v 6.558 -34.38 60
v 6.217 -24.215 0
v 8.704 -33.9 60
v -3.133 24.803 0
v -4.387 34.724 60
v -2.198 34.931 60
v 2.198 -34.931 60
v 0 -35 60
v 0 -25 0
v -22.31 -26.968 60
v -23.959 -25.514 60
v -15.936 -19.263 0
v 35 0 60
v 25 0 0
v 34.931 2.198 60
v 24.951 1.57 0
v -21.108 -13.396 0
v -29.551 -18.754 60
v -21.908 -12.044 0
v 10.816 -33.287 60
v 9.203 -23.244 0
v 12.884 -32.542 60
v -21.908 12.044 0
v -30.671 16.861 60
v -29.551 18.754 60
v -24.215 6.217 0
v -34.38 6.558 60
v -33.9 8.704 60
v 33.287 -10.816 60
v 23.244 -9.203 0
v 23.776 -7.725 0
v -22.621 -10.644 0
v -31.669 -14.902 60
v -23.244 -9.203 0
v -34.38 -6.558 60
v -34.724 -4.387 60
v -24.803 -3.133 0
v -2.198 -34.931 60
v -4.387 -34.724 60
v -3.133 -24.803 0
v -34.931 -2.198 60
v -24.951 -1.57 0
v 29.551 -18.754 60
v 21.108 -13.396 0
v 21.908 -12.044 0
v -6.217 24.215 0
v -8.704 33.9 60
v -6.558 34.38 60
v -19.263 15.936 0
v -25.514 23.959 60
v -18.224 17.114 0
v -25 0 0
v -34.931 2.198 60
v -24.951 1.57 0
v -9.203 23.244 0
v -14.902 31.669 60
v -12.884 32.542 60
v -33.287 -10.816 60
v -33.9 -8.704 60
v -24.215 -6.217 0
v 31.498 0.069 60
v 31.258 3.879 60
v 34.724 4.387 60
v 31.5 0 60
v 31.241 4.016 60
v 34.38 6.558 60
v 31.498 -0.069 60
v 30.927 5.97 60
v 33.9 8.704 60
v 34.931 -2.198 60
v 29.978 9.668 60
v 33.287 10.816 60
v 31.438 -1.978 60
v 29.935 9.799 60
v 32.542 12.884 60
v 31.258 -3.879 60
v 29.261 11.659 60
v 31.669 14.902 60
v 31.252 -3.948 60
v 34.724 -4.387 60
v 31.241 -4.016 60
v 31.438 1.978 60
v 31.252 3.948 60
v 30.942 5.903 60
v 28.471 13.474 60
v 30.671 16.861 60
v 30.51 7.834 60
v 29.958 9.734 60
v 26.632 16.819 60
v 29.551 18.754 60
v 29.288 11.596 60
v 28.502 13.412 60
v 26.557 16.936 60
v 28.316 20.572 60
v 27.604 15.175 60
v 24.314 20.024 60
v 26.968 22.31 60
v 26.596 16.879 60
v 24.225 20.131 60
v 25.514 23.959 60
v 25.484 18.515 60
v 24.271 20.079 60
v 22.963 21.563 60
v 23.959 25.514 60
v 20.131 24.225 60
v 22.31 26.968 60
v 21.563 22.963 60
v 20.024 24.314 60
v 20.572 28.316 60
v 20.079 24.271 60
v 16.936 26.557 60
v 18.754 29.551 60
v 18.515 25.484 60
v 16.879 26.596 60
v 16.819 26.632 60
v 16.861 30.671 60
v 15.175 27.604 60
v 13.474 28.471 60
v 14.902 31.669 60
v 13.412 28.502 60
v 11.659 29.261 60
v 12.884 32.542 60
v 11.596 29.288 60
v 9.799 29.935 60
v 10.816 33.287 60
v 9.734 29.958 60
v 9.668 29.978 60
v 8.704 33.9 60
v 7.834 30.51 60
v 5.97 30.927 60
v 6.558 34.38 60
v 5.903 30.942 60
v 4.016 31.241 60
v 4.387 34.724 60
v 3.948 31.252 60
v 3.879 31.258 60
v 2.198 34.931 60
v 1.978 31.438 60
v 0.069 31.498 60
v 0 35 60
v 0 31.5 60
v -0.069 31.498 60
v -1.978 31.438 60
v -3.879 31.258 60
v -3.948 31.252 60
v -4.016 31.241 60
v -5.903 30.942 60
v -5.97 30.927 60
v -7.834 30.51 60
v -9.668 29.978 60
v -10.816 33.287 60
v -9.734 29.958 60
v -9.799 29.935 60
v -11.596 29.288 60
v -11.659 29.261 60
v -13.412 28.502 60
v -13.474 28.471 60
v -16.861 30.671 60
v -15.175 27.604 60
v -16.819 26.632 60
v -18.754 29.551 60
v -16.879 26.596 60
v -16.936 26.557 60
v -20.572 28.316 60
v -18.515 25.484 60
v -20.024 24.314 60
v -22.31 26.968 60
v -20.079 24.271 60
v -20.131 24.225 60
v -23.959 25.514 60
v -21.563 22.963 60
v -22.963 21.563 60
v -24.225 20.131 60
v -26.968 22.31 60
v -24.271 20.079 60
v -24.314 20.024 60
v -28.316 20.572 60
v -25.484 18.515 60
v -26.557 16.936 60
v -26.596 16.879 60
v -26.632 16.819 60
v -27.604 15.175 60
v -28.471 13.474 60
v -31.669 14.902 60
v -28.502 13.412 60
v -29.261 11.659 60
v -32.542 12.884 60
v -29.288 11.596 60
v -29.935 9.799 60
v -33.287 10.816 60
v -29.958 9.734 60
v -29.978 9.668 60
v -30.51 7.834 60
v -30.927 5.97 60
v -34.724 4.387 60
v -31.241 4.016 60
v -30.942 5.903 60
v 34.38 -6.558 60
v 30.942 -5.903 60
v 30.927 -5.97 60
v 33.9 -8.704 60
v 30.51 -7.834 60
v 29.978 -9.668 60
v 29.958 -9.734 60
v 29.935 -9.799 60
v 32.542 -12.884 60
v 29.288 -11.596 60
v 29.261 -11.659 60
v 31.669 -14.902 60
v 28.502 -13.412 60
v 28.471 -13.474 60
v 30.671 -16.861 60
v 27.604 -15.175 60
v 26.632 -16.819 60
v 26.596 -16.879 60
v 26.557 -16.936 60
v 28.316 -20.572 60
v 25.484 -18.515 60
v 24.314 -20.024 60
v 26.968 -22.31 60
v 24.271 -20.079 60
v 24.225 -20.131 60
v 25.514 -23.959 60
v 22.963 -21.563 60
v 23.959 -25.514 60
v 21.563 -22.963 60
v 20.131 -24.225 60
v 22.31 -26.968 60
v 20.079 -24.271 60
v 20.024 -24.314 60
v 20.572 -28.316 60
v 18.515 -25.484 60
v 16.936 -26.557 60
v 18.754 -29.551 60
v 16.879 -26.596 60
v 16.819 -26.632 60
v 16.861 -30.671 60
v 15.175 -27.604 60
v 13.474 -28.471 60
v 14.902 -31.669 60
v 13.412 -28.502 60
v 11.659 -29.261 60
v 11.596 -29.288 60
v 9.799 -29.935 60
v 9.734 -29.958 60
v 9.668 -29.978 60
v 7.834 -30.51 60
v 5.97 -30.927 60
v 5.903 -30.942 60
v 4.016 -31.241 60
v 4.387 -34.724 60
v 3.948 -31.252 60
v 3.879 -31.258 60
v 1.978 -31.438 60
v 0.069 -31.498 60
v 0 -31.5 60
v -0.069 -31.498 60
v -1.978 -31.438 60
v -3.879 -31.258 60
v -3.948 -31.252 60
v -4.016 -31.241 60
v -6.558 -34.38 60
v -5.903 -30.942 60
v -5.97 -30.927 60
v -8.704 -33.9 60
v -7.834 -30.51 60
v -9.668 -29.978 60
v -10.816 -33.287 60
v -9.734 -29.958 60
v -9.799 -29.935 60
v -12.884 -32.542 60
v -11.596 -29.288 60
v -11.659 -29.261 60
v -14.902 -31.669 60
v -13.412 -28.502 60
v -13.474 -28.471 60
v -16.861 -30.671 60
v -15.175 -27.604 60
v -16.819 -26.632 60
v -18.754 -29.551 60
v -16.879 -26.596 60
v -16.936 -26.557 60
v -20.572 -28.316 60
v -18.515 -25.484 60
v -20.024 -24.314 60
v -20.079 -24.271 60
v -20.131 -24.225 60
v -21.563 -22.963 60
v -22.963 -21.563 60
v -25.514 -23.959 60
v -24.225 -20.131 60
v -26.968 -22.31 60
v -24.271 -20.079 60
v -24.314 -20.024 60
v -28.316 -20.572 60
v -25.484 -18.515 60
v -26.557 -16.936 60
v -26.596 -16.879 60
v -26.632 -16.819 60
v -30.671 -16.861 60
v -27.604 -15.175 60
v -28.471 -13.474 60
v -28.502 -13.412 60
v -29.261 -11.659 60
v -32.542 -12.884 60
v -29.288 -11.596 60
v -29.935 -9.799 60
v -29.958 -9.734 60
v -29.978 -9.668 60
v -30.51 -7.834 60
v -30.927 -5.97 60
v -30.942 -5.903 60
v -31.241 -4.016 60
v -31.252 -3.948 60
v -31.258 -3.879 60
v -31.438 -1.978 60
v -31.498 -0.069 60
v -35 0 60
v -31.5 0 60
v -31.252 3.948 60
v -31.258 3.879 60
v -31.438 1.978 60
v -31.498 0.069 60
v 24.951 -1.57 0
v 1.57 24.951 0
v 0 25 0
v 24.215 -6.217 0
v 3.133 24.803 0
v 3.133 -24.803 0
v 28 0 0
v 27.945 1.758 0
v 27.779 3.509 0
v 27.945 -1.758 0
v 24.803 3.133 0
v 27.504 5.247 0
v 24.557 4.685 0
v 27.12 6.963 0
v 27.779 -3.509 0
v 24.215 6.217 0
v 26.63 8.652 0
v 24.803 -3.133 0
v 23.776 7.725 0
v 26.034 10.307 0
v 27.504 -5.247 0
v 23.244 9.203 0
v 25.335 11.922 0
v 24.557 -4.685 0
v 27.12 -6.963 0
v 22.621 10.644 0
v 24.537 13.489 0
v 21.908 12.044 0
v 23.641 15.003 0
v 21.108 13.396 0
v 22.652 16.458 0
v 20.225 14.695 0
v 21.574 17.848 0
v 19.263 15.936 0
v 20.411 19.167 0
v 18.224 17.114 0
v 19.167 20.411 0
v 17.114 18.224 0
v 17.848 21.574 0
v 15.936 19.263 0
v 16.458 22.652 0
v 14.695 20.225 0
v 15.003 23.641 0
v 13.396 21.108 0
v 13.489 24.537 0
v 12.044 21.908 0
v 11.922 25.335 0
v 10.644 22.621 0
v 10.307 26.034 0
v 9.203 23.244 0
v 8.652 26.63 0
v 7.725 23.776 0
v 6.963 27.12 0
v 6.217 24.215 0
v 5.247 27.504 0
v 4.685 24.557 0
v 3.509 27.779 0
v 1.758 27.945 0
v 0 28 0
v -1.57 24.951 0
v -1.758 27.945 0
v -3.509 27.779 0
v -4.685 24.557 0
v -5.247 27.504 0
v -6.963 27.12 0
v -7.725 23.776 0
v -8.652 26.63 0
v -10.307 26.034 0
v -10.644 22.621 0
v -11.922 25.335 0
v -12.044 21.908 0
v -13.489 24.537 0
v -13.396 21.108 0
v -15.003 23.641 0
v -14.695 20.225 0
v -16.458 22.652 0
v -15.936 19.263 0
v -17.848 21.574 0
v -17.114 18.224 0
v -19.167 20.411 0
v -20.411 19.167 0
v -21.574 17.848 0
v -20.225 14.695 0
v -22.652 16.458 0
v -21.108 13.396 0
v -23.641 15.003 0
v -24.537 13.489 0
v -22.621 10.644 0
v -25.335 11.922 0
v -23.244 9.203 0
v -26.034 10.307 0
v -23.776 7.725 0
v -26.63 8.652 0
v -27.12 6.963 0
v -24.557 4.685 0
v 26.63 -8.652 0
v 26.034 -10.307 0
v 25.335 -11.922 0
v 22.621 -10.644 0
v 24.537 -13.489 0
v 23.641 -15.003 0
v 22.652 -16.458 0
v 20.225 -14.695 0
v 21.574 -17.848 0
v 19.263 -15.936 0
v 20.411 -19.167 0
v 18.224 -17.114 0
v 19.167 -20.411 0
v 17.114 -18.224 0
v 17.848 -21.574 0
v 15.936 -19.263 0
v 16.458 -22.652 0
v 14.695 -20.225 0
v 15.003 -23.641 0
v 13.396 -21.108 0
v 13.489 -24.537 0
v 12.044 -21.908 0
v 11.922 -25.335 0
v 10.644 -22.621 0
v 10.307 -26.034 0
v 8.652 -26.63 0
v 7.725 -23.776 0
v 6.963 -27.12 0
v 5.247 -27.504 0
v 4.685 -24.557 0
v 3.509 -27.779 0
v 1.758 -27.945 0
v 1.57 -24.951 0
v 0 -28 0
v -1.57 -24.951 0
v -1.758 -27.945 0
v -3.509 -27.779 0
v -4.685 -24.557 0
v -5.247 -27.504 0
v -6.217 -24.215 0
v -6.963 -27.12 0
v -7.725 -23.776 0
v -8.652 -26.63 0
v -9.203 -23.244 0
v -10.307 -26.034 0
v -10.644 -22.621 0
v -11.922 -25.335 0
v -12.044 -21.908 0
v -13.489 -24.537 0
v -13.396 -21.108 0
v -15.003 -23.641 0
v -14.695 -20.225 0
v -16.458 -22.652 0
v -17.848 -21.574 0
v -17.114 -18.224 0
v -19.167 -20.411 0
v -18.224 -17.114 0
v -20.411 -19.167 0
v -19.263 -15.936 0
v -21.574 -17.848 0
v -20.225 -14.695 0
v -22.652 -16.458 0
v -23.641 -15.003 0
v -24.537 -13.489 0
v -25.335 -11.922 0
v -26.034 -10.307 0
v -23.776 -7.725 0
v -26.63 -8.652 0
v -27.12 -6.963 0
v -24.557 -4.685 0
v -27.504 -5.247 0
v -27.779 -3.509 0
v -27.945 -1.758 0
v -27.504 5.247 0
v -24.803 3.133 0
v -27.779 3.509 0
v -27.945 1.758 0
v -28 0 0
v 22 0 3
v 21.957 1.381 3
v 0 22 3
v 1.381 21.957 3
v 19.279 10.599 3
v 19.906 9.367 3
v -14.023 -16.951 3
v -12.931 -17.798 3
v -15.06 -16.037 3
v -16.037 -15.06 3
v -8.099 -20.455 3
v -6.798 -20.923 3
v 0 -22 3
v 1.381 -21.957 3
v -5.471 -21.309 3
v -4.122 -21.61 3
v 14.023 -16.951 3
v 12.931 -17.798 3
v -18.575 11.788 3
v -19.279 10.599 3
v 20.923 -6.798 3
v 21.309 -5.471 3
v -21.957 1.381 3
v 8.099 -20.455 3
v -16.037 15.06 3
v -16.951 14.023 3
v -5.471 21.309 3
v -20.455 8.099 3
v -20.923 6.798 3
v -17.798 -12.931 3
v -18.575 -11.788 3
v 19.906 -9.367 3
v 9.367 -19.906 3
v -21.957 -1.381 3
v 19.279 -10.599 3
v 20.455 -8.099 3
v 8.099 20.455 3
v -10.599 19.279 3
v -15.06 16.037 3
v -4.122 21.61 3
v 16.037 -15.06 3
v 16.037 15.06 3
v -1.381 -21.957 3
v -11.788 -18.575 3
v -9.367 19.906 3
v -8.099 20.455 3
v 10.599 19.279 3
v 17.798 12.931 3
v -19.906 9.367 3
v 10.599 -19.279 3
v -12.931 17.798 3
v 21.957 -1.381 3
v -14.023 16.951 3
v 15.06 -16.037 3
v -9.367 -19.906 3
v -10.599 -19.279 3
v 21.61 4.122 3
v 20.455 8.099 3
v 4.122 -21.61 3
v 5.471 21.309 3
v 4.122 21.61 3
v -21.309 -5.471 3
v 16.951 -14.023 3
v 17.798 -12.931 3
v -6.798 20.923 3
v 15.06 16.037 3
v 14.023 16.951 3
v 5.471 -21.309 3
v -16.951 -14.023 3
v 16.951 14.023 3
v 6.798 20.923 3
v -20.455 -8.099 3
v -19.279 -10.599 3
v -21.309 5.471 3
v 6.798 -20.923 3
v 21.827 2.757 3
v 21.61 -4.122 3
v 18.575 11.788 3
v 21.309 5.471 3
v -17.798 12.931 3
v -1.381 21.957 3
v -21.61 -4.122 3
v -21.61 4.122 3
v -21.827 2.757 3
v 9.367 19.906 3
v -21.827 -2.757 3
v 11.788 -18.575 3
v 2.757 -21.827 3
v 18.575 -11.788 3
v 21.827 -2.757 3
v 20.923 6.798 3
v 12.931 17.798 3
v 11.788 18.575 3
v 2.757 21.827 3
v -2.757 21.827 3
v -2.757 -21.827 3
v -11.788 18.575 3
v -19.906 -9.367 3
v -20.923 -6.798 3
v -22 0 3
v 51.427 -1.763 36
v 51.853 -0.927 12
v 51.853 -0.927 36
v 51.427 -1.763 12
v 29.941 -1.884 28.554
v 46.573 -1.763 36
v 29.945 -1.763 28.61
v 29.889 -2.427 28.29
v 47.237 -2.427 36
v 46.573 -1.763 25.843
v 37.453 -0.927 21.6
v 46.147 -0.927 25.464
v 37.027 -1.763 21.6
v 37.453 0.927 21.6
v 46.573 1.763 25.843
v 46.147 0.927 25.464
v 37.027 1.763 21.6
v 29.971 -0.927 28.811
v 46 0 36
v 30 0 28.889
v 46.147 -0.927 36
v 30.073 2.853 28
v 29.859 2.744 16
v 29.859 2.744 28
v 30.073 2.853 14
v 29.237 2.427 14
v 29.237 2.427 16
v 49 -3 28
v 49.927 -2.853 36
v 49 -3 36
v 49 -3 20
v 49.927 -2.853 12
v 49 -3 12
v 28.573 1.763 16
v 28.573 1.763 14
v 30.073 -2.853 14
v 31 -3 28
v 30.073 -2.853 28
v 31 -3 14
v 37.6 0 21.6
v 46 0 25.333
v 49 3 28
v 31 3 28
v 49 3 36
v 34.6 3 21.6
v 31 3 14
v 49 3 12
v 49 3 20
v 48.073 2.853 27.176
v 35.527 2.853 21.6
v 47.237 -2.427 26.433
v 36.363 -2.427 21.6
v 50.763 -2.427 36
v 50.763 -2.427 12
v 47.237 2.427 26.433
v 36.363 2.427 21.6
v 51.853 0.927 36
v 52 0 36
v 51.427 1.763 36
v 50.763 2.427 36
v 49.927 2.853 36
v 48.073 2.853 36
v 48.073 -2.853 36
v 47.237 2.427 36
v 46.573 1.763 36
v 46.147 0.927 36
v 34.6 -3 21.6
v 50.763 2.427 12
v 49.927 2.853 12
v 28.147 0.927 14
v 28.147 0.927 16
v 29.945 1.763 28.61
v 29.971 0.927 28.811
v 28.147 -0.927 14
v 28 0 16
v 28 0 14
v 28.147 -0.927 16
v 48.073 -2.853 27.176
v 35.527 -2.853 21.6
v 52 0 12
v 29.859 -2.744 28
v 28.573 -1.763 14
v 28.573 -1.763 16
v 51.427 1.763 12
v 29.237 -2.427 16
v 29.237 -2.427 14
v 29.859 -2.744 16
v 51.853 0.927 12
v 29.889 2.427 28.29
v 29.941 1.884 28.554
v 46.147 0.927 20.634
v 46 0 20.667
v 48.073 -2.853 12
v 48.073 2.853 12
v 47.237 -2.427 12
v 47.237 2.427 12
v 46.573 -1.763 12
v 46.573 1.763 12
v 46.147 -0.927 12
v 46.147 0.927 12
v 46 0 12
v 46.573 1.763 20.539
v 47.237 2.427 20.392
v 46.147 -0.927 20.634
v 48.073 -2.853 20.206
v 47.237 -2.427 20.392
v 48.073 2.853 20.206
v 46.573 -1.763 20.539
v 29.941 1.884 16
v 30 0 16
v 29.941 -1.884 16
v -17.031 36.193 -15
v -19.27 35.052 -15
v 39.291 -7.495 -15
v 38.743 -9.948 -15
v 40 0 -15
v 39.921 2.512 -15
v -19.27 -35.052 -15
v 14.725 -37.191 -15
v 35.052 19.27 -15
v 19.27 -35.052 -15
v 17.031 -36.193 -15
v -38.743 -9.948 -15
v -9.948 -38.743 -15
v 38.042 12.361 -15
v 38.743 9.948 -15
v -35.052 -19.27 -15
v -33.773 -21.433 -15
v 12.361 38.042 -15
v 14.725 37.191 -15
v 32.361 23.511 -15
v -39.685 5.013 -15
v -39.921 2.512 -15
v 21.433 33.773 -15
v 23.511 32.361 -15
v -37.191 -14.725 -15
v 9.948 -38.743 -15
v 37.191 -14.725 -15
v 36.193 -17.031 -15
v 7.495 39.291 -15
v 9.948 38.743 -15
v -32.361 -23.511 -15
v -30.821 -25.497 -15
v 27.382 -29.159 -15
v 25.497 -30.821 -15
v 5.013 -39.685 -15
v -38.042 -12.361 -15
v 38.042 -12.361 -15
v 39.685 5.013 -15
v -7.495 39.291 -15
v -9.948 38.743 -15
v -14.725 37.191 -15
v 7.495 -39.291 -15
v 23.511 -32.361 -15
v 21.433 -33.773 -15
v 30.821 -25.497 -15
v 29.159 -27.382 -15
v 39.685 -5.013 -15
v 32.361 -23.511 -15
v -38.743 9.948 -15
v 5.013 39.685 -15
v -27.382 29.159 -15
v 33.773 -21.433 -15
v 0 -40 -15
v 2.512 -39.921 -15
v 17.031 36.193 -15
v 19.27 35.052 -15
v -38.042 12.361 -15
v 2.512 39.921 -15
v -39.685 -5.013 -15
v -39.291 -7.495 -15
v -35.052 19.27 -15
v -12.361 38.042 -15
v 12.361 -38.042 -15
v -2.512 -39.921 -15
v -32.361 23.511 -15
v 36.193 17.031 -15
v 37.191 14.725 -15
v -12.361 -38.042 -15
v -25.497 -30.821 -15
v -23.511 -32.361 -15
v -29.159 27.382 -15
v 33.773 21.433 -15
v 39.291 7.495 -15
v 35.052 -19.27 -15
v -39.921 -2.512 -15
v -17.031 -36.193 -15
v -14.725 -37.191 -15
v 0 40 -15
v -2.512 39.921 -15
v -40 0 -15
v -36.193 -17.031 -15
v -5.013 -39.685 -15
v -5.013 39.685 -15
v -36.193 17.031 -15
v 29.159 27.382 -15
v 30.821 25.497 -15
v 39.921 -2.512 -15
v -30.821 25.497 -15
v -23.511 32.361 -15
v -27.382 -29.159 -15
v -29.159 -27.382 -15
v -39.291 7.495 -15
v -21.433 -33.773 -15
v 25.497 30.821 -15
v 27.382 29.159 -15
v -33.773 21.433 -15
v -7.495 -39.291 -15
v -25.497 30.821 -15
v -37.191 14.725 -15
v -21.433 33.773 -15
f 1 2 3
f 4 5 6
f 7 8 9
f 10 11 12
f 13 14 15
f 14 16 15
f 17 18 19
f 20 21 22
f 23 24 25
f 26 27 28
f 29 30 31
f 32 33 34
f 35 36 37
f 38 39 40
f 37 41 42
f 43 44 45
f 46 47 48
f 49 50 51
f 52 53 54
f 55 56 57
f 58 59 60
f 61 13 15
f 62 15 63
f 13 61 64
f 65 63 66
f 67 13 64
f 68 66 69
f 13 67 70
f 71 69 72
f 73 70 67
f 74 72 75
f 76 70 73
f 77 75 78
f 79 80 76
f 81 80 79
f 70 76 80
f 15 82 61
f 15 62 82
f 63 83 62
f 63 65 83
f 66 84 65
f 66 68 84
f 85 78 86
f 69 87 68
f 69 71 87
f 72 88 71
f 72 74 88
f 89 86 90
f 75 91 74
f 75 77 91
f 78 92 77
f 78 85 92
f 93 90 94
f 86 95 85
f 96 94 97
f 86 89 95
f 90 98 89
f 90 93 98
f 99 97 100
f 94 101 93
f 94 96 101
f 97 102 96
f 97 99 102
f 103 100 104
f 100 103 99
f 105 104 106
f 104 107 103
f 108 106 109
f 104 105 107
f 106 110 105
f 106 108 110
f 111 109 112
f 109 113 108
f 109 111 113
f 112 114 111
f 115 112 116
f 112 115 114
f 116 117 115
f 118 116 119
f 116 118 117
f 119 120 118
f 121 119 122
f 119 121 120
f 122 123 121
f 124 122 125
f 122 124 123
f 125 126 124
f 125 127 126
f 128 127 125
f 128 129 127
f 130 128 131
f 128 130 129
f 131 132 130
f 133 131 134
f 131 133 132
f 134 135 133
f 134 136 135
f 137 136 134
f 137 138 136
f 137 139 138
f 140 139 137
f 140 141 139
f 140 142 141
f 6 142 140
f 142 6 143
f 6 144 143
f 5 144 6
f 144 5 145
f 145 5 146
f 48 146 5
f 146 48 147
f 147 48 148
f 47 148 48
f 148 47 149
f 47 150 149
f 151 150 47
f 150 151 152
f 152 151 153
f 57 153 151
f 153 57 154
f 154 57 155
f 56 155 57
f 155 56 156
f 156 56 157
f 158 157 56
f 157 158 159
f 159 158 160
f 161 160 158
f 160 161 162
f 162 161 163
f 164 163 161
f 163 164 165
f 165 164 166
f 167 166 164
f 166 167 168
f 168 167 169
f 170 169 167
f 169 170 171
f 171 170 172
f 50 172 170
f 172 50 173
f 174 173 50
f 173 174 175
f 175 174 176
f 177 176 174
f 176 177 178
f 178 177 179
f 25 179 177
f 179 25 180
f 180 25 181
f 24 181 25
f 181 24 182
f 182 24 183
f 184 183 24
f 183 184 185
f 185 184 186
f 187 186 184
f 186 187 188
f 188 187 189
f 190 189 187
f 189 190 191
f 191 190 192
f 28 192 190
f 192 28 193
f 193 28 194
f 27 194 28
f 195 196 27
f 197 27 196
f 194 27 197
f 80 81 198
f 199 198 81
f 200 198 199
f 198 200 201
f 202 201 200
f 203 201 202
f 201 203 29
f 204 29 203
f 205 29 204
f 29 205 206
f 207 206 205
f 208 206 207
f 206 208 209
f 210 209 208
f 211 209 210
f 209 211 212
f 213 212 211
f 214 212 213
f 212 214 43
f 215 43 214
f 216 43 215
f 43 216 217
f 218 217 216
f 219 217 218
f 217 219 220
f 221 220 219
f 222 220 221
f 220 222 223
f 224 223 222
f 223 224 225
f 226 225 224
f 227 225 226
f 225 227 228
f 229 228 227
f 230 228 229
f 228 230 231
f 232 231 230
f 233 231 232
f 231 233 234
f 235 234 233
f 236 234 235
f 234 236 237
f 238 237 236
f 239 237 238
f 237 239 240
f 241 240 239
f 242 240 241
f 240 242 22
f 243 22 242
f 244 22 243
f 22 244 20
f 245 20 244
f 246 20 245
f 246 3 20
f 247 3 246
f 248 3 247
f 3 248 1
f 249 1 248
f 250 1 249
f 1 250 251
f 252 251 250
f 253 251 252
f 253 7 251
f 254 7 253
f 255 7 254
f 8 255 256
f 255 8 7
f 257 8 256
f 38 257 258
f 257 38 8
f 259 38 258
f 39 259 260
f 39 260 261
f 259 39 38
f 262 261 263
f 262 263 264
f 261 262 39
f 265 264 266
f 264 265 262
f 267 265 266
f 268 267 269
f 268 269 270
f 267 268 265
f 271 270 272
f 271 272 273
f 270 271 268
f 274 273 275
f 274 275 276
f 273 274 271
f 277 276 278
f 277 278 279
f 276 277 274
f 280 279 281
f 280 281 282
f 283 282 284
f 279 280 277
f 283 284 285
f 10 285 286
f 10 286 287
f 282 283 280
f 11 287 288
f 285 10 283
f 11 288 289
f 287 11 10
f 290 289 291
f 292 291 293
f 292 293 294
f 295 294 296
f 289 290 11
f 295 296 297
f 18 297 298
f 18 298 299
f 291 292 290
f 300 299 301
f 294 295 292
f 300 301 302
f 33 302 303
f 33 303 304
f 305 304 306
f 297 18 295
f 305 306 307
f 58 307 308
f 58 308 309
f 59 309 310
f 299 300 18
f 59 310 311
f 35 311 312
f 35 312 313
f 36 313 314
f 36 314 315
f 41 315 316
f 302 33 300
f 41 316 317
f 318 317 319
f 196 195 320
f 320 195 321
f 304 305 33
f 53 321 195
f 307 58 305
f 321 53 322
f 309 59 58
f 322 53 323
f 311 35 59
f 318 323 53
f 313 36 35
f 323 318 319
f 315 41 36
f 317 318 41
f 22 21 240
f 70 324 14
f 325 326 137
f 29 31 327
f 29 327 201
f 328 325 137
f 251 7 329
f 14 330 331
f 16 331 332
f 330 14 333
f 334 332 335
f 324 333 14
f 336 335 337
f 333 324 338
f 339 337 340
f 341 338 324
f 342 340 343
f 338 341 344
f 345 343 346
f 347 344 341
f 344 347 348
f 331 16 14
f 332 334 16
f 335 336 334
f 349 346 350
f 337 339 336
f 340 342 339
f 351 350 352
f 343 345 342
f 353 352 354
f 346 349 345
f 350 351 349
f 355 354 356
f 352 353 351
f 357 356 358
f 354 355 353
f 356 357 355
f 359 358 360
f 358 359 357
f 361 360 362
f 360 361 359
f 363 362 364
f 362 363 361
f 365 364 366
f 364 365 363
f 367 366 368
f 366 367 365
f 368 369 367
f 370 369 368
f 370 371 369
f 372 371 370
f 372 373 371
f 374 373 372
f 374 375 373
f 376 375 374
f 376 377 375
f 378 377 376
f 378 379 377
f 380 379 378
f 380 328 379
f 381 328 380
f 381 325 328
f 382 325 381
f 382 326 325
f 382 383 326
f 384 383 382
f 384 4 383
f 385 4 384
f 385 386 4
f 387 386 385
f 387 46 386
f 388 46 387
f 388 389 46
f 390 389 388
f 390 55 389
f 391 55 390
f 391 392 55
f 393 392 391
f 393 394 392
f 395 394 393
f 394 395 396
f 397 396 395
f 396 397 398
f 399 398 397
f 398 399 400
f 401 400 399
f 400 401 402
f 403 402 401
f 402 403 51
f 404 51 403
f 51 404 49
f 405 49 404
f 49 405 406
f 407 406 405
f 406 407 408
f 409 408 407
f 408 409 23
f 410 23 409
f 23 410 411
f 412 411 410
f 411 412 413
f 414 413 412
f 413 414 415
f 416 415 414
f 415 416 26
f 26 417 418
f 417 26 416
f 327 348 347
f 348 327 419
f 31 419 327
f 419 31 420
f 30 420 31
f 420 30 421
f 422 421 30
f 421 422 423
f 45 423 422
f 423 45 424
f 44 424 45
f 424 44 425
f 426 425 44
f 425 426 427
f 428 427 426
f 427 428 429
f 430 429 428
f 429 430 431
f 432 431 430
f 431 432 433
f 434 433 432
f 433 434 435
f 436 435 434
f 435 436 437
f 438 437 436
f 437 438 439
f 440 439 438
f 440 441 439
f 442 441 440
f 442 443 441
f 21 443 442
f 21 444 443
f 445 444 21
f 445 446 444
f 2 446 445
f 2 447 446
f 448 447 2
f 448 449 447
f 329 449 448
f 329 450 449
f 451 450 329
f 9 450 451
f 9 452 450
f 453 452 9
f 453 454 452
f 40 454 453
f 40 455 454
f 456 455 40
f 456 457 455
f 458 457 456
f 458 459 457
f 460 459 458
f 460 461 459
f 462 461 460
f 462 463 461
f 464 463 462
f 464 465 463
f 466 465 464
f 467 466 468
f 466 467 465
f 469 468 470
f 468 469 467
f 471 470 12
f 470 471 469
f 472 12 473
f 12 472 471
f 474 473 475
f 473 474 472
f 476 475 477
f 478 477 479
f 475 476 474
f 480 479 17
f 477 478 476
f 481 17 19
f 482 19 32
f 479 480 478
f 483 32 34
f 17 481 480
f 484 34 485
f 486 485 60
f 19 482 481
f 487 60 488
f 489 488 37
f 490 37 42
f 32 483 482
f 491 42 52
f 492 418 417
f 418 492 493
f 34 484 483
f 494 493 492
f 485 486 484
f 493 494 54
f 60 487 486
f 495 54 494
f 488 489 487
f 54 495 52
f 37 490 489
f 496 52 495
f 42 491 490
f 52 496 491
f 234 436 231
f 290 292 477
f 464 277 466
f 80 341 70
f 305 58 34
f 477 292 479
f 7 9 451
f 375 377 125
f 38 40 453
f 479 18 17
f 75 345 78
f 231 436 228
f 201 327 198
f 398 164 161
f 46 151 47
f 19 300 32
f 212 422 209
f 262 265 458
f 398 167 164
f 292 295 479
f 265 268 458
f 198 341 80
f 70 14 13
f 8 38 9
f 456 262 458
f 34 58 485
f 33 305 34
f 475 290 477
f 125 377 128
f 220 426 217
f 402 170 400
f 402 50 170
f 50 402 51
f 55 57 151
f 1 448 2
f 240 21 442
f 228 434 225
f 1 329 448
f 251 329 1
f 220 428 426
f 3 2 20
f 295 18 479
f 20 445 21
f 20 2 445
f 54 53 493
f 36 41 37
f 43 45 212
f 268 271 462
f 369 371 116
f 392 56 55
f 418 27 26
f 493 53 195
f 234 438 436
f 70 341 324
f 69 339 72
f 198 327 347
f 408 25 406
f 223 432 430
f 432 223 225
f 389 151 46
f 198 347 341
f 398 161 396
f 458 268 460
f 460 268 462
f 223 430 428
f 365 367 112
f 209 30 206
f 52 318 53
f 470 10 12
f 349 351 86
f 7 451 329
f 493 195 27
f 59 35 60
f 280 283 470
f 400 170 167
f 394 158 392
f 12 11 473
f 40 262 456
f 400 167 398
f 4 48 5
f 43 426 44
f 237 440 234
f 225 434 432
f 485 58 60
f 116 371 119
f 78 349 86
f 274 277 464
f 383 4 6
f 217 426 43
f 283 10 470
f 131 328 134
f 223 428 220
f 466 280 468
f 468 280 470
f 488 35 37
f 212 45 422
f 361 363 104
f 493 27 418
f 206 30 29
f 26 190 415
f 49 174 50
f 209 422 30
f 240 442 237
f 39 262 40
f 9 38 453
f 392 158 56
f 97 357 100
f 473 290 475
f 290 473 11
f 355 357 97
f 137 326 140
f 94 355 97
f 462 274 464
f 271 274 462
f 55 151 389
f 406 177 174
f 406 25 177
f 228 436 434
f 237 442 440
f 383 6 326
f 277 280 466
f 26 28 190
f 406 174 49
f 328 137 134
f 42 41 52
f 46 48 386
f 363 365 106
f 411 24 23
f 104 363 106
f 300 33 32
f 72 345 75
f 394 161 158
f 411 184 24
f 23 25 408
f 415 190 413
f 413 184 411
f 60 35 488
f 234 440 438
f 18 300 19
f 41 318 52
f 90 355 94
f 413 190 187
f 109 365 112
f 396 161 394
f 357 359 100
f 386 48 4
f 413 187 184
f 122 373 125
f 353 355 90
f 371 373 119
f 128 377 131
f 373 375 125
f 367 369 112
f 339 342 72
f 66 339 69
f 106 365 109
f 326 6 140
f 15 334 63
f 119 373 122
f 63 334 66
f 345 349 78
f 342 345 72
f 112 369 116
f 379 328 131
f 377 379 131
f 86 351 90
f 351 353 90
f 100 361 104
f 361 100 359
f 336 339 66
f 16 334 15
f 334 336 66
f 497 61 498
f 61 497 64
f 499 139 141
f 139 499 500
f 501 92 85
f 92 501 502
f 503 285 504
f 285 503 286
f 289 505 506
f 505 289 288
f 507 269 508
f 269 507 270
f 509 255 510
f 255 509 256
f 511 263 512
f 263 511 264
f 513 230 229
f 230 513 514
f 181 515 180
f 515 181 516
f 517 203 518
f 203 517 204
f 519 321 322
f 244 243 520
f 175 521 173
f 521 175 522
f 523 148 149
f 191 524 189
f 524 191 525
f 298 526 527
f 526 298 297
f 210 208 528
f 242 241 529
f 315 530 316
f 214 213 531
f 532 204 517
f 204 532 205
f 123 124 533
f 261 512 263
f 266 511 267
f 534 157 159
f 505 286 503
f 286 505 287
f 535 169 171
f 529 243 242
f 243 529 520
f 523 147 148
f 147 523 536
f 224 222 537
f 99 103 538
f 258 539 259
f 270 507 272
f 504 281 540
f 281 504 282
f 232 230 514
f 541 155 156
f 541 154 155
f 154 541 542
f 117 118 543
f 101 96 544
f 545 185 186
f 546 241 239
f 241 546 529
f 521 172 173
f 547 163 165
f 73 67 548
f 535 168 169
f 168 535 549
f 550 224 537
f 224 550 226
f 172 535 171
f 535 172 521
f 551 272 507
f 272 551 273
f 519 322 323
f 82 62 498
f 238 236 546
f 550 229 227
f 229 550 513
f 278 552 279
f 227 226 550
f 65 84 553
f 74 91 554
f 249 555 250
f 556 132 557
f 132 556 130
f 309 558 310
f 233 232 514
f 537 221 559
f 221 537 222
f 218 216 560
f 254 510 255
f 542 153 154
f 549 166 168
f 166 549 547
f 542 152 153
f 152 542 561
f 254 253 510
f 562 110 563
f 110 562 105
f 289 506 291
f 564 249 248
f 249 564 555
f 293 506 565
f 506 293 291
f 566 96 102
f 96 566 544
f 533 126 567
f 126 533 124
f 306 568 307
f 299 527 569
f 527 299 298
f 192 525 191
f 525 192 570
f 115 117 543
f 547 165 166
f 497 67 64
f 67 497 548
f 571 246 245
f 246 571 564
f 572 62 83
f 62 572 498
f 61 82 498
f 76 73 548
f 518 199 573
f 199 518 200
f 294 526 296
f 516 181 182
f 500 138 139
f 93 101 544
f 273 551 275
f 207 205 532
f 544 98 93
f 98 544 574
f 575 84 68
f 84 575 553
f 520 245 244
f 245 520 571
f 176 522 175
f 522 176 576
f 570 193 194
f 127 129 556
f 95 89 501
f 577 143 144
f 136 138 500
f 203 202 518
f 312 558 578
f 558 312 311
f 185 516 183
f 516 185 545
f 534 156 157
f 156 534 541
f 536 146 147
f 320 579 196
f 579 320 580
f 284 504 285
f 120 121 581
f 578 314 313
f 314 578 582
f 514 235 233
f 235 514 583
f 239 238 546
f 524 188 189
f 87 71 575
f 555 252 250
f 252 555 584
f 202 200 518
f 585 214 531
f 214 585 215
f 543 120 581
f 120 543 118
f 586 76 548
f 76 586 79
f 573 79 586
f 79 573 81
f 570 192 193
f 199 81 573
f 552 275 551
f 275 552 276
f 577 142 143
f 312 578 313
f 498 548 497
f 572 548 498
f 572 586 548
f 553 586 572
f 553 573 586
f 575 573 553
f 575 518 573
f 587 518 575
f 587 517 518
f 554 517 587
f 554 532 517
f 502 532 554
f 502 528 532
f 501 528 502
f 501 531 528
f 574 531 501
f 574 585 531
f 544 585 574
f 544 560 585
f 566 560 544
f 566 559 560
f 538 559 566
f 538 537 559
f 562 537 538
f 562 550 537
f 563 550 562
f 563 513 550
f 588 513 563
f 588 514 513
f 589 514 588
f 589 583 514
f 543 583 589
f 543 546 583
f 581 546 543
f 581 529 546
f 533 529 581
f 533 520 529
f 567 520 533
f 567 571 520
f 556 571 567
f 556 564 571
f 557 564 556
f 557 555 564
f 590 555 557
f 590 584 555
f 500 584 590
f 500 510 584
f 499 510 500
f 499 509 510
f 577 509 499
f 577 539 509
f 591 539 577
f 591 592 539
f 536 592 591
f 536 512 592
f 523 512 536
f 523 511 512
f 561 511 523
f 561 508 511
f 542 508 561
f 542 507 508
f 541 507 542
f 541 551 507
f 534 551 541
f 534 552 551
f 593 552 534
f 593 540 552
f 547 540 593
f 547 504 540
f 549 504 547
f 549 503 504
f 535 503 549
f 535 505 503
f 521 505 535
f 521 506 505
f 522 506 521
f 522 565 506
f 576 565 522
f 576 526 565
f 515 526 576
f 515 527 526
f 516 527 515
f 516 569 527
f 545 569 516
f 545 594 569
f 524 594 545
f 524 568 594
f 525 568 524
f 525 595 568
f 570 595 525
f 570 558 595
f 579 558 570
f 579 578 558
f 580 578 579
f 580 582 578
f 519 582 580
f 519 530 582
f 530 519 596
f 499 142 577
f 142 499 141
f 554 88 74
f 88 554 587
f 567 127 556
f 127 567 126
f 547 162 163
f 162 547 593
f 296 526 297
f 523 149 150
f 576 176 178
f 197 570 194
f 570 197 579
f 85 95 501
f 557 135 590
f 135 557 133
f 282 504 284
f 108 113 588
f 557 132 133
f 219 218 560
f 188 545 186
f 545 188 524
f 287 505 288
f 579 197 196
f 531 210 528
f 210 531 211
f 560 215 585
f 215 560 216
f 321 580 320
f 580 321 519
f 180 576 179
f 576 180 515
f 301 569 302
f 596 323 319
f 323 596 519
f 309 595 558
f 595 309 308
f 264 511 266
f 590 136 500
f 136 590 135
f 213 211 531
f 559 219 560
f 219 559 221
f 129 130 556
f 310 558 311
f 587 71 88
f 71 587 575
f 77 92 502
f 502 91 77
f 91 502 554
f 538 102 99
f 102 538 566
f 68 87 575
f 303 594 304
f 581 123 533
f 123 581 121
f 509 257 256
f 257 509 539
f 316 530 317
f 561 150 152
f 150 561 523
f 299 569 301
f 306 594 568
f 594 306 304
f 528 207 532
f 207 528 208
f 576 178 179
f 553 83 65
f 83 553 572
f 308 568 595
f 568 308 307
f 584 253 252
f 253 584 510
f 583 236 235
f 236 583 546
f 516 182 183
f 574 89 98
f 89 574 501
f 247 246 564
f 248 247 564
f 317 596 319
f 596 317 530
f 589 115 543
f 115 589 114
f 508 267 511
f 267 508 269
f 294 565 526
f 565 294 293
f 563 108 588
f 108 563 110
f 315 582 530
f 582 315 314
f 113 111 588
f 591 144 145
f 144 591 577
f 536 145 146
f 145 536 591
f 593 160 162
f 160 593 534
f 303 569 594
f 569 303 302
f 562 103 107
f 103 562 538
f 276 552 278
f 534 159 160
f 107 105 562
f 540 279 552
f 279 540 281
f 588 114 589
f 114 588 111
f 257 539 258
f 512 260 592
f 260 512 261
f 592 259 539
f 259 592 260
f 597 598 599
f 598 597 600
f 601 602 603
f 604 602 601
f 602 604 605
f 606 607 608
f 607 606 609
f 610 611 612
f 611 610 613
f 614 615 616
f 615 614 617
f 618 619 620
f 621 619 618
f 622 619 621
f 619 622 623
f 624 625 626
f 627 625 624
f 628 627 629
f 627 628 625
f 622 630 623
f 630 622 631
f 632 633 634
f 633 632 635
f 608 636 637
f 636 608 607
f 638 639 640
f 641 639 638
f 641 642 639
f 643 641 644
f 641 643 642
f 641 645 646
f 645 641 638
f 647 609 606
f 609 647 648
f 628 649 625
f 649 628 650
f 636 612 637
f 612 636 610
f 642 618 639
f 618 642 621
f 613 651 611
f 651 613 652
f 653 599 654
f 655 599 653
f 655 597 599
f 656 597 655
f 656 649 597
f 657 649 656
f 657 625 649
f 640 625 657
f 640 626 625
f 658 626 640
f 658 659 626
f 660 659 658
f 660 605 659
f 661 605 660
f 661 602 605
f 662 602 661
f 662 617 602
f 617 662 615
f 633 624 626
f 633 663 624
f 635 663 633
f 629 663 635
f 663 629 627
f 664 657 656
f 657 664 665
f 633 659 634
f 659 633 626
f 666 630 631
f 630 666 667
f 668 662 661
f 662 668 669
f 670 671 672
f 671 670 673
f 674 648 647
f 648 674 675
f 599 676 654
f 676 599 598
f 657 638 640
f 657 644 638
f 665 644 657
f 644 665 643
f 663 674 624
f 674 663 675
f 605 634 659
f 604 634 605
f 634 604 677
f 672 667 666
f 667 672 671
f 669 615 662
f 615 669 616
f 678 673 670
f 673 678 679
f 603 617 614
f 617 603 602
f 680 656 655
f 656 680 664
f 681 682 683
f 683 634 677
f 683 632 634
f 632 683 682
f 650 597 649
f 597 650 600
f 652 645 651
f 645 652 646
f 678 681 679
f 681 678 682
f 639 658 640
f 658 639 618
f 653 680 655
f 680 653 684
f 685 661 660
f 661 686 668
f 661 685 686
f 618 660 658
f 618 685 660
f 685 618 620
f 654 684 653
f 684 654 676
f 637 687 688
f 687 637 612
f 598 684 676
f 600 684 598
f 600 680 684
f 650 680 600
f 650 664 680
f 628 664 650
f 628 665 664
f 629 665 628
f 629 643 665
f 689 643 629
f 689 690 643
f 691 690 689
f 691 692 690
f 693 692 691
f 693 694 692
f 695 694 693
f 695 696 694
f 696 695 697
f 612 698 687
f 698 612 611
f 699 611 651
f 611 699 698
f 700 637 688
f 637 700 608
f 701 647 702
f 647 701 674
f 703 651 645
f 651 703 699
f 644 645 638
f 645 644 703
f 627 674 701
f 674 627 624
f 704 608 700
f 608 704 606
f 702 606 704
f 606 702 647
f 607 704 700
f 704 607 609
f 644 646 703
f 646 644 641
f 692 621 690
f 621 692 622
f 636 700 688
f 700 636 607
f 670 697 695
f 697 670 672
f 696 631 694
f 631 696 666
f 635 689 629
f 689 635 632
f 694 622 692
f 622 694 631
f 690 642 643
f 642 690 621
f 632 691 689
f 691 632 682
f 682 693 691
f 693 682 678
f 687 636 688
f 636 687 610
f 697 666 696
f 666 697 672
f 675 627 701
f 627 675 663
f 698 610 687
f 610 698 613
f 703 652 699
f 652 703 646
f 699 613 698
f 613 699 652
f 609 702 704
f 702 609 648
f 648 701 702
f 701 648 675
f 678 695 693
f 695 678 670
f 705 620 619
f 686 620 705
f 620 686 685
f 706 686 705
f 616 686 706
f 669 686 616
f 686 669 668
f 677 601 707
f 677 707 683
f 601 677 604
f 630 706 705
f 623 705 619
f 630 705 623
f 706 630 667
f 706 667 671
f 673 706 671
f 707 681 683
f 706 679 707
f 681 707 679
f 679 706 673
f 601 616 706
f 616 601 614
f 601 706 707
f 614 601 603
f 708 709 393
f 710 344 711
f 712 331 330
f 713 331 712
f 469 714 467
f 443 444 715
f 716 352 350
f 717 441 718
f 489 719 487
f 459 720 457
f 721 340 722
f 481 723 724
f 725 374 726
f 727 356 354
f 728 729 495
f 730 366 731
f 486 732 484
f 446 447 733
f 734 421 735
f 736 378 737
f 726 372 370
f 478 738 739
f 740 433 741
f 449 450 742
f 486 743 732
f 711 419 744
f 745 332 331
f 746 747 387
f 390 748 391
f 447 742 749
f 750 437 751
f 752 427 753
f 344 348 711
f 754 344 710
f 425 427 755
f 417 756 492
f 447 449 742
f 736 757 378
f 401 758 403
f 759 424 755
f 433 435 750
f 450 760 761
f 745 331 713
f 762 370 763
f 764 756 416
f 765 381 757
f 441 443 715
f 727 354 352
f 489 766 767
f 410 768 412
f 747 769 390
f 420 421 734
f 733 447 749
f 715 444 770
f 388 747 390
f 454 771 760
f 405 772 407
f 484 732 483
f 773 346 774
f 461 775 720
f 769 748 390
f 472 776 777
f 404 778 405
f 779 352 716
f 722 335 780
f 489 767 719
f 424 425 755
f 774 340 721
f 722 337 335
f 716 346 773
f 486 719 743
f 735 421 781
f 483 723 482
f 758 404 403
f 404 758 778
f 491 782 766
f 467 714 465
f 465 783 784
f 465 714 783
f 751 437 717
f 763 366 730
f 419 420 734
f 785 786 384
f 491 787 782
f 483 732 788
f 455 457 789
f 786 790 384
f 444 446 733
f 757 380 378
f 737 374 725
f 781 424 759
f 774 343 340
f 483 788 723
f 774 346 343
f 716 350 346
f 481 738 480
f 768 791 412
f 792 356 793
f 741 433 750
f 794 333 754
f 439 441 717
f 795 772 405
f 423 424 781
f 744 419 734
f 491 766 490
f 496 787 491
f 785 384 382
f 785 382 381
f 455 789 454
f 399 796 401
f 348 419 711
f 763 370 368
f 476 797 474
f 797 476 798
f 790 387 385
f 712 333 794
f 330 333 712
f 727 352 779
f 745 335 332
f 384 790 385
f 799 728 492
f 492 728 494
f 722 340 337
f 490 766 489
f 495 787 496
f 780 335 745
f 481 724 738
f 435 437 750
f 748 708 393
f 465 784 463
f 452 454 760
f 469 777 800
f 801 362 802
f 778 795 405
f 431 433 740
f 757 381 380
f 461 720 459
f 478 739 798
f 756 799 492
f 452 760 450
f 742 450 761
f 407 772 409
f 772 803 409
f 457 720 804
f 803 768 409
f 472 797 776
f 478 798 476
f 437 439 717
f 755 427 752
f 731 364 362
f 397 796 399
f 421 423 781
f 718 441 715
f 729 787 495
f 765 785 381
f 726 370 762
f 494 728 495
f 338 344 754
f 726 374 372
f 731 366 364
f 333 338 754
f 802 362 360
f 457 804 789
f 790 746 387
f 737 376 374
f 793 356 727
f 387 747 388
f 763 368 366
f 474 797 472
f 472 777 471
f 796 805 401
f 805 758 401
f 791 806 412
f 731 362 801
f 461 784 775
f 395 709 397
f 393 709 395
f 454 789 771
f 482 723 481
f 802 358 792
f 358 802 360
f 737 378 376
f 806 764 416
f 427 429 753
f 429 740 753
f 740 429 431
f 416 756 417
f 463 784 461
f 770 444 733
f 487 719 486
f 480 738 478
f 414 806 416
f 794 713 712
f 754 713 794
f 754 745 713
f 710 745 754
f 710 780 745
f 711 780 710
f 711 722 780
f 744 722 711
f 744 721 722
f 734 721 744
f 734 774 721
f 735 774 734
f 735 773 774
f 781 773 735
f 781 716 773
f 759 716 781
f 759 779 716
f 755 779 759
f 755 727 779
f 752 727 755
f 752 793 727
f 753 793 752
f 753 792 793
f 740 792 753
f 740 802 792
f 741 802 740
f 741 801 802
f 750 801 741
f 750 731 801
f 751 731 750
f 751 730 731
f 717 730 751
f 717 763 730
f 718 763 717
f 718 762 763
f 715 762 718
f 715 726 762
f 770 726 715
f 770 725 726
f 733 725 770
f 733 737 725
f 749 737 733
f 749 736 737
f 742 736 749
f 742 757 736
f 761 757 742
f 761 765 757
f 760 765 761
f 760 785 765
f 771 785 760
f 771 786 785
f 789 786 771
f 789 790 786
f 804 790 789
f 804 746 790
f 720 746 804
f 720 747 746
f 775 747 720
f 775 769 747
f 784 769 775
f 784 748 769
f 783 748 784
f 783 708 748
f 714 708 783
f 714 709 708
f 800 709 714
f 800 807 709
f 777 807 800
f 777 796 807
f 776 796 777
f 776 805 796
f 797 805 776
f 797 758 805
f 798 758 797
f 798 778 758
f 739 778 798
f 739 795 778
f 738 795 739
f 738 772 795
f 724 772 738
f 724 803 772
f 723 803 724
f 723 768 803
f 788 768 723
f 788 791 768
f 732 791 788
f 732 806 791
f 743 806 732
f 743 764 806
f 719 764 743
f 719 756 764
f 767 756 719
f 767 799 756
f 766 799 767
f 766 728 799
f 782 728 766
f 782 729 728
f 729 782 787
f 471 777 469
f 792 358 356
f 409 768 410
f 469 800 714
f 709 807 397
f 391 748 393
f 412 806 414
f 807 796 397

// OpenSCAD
// Decorative cup with corrected handle - FINAL VERSION

// Parameters
cup_height = 60;
cup_top_radius = 35;
cup_bottom_radius = 25;
cup_wall_thickness = 3;

pedestal_height = 15;
pedestal_radius = 40;
pedestal_top_radius = 28;

handle_width = 8;
handle_thickness = 6;

// Main assembly
union() {
    // Cup with handle
    cup_with_handle();
    
    // Pedestal base
    translate([0, 0, -pedestal_height])
        pedestal();
}

// Cup with handle
module cup_with_handle() {
    union() {
        // Main cup body
        cup_body();
        
        // Handle - COMPLETELY REWRITTEN
        handle_new();
    }
}

// Cup body (hollow cylinder with tapered walls)
module cup_body() {
    difference() {
        // Outer cup shape
        cylinder(h = cup_height, 
                r1 = cup_bottom_radius, 
                r2 = cup_top_radius, 
                $fn = 100);
        
        // Inner hollow space
        translate([0, 0, cup_wall_thickness])
            cylinder(h = cup_height, 
                    r1 = cup_bottom_radius - cup_wall_thickness, 
                    r2 = cup_top_radius - cup_wall_thickness, 
                    $fn = 100);
    }
}

// NEW HANDLE - Completely rewritten approach
module handle_new() {
    // Handle positioned at 40% height
    handle_z = cup_height * 0.4;
    // Cup radius at handle height (linear interpolation)
    cup_r = cup_bottom_radius + (cup_top_radius - cup_bottom_radius) * 0.4;
    
    translate([0, 0, handle_z]) {
        difference() {
            union() {
                // Main handle loop - using hull between two cylinders
                hull() {
                    // Inner attachment point
                    translate([cup_r + 2, 0, 0])
                        cylinder(h = handle_width, r = handle_thickness/2, center = true, $fn = 20);
                    
                    // Outer curve point
                    translate([cup_r + 20, 0, 8])
                        cylinder(h = handle_width, r = handle_thickness/2, center = true, $fn = 20);
                }
                
                hull() {
                    // Outer curve point (top)
                    translate([cup_r + 20, 0, 8])
                        cylinder(h = handle_width, r = handle_thickness/2, center = true, $fn = 20);
                    
                    // Outer curve point (bottom)
                    translate([cup_r + 20, 0, -8])
                        cylinder(h = handle_width, r = handle_thickness/2, center = true, $fn = 20);
                }
                
                hull() {
                    // Outer curve point (bottom)
                    translate([cup_r + 20, 0, -8])
                        cylinder(h = handle_width, r = handle_thickness/2, center = true, $fn = 20);
                    
                    // Inner attachment point (bottom)
                    translate([cup_r + 2, 0, -6])
                        cylinder(h = handle_width, r = handle_thickness/2, center = true, $fn = 20);
                }
            }
            
            // Remove interference with cup
            translate([0, 0, -handle_width])
                cylinder(h = handle_width*2, r = cup_r + 1, $fn = 100);
        }
    }
}

// Pedestal base
module pedestal() {
    cylinder(h = pedestal_height, 
            r1 = pedestal_radius, 
            r2 = pedestal_top_radius, 
            $fn = 100);
}
